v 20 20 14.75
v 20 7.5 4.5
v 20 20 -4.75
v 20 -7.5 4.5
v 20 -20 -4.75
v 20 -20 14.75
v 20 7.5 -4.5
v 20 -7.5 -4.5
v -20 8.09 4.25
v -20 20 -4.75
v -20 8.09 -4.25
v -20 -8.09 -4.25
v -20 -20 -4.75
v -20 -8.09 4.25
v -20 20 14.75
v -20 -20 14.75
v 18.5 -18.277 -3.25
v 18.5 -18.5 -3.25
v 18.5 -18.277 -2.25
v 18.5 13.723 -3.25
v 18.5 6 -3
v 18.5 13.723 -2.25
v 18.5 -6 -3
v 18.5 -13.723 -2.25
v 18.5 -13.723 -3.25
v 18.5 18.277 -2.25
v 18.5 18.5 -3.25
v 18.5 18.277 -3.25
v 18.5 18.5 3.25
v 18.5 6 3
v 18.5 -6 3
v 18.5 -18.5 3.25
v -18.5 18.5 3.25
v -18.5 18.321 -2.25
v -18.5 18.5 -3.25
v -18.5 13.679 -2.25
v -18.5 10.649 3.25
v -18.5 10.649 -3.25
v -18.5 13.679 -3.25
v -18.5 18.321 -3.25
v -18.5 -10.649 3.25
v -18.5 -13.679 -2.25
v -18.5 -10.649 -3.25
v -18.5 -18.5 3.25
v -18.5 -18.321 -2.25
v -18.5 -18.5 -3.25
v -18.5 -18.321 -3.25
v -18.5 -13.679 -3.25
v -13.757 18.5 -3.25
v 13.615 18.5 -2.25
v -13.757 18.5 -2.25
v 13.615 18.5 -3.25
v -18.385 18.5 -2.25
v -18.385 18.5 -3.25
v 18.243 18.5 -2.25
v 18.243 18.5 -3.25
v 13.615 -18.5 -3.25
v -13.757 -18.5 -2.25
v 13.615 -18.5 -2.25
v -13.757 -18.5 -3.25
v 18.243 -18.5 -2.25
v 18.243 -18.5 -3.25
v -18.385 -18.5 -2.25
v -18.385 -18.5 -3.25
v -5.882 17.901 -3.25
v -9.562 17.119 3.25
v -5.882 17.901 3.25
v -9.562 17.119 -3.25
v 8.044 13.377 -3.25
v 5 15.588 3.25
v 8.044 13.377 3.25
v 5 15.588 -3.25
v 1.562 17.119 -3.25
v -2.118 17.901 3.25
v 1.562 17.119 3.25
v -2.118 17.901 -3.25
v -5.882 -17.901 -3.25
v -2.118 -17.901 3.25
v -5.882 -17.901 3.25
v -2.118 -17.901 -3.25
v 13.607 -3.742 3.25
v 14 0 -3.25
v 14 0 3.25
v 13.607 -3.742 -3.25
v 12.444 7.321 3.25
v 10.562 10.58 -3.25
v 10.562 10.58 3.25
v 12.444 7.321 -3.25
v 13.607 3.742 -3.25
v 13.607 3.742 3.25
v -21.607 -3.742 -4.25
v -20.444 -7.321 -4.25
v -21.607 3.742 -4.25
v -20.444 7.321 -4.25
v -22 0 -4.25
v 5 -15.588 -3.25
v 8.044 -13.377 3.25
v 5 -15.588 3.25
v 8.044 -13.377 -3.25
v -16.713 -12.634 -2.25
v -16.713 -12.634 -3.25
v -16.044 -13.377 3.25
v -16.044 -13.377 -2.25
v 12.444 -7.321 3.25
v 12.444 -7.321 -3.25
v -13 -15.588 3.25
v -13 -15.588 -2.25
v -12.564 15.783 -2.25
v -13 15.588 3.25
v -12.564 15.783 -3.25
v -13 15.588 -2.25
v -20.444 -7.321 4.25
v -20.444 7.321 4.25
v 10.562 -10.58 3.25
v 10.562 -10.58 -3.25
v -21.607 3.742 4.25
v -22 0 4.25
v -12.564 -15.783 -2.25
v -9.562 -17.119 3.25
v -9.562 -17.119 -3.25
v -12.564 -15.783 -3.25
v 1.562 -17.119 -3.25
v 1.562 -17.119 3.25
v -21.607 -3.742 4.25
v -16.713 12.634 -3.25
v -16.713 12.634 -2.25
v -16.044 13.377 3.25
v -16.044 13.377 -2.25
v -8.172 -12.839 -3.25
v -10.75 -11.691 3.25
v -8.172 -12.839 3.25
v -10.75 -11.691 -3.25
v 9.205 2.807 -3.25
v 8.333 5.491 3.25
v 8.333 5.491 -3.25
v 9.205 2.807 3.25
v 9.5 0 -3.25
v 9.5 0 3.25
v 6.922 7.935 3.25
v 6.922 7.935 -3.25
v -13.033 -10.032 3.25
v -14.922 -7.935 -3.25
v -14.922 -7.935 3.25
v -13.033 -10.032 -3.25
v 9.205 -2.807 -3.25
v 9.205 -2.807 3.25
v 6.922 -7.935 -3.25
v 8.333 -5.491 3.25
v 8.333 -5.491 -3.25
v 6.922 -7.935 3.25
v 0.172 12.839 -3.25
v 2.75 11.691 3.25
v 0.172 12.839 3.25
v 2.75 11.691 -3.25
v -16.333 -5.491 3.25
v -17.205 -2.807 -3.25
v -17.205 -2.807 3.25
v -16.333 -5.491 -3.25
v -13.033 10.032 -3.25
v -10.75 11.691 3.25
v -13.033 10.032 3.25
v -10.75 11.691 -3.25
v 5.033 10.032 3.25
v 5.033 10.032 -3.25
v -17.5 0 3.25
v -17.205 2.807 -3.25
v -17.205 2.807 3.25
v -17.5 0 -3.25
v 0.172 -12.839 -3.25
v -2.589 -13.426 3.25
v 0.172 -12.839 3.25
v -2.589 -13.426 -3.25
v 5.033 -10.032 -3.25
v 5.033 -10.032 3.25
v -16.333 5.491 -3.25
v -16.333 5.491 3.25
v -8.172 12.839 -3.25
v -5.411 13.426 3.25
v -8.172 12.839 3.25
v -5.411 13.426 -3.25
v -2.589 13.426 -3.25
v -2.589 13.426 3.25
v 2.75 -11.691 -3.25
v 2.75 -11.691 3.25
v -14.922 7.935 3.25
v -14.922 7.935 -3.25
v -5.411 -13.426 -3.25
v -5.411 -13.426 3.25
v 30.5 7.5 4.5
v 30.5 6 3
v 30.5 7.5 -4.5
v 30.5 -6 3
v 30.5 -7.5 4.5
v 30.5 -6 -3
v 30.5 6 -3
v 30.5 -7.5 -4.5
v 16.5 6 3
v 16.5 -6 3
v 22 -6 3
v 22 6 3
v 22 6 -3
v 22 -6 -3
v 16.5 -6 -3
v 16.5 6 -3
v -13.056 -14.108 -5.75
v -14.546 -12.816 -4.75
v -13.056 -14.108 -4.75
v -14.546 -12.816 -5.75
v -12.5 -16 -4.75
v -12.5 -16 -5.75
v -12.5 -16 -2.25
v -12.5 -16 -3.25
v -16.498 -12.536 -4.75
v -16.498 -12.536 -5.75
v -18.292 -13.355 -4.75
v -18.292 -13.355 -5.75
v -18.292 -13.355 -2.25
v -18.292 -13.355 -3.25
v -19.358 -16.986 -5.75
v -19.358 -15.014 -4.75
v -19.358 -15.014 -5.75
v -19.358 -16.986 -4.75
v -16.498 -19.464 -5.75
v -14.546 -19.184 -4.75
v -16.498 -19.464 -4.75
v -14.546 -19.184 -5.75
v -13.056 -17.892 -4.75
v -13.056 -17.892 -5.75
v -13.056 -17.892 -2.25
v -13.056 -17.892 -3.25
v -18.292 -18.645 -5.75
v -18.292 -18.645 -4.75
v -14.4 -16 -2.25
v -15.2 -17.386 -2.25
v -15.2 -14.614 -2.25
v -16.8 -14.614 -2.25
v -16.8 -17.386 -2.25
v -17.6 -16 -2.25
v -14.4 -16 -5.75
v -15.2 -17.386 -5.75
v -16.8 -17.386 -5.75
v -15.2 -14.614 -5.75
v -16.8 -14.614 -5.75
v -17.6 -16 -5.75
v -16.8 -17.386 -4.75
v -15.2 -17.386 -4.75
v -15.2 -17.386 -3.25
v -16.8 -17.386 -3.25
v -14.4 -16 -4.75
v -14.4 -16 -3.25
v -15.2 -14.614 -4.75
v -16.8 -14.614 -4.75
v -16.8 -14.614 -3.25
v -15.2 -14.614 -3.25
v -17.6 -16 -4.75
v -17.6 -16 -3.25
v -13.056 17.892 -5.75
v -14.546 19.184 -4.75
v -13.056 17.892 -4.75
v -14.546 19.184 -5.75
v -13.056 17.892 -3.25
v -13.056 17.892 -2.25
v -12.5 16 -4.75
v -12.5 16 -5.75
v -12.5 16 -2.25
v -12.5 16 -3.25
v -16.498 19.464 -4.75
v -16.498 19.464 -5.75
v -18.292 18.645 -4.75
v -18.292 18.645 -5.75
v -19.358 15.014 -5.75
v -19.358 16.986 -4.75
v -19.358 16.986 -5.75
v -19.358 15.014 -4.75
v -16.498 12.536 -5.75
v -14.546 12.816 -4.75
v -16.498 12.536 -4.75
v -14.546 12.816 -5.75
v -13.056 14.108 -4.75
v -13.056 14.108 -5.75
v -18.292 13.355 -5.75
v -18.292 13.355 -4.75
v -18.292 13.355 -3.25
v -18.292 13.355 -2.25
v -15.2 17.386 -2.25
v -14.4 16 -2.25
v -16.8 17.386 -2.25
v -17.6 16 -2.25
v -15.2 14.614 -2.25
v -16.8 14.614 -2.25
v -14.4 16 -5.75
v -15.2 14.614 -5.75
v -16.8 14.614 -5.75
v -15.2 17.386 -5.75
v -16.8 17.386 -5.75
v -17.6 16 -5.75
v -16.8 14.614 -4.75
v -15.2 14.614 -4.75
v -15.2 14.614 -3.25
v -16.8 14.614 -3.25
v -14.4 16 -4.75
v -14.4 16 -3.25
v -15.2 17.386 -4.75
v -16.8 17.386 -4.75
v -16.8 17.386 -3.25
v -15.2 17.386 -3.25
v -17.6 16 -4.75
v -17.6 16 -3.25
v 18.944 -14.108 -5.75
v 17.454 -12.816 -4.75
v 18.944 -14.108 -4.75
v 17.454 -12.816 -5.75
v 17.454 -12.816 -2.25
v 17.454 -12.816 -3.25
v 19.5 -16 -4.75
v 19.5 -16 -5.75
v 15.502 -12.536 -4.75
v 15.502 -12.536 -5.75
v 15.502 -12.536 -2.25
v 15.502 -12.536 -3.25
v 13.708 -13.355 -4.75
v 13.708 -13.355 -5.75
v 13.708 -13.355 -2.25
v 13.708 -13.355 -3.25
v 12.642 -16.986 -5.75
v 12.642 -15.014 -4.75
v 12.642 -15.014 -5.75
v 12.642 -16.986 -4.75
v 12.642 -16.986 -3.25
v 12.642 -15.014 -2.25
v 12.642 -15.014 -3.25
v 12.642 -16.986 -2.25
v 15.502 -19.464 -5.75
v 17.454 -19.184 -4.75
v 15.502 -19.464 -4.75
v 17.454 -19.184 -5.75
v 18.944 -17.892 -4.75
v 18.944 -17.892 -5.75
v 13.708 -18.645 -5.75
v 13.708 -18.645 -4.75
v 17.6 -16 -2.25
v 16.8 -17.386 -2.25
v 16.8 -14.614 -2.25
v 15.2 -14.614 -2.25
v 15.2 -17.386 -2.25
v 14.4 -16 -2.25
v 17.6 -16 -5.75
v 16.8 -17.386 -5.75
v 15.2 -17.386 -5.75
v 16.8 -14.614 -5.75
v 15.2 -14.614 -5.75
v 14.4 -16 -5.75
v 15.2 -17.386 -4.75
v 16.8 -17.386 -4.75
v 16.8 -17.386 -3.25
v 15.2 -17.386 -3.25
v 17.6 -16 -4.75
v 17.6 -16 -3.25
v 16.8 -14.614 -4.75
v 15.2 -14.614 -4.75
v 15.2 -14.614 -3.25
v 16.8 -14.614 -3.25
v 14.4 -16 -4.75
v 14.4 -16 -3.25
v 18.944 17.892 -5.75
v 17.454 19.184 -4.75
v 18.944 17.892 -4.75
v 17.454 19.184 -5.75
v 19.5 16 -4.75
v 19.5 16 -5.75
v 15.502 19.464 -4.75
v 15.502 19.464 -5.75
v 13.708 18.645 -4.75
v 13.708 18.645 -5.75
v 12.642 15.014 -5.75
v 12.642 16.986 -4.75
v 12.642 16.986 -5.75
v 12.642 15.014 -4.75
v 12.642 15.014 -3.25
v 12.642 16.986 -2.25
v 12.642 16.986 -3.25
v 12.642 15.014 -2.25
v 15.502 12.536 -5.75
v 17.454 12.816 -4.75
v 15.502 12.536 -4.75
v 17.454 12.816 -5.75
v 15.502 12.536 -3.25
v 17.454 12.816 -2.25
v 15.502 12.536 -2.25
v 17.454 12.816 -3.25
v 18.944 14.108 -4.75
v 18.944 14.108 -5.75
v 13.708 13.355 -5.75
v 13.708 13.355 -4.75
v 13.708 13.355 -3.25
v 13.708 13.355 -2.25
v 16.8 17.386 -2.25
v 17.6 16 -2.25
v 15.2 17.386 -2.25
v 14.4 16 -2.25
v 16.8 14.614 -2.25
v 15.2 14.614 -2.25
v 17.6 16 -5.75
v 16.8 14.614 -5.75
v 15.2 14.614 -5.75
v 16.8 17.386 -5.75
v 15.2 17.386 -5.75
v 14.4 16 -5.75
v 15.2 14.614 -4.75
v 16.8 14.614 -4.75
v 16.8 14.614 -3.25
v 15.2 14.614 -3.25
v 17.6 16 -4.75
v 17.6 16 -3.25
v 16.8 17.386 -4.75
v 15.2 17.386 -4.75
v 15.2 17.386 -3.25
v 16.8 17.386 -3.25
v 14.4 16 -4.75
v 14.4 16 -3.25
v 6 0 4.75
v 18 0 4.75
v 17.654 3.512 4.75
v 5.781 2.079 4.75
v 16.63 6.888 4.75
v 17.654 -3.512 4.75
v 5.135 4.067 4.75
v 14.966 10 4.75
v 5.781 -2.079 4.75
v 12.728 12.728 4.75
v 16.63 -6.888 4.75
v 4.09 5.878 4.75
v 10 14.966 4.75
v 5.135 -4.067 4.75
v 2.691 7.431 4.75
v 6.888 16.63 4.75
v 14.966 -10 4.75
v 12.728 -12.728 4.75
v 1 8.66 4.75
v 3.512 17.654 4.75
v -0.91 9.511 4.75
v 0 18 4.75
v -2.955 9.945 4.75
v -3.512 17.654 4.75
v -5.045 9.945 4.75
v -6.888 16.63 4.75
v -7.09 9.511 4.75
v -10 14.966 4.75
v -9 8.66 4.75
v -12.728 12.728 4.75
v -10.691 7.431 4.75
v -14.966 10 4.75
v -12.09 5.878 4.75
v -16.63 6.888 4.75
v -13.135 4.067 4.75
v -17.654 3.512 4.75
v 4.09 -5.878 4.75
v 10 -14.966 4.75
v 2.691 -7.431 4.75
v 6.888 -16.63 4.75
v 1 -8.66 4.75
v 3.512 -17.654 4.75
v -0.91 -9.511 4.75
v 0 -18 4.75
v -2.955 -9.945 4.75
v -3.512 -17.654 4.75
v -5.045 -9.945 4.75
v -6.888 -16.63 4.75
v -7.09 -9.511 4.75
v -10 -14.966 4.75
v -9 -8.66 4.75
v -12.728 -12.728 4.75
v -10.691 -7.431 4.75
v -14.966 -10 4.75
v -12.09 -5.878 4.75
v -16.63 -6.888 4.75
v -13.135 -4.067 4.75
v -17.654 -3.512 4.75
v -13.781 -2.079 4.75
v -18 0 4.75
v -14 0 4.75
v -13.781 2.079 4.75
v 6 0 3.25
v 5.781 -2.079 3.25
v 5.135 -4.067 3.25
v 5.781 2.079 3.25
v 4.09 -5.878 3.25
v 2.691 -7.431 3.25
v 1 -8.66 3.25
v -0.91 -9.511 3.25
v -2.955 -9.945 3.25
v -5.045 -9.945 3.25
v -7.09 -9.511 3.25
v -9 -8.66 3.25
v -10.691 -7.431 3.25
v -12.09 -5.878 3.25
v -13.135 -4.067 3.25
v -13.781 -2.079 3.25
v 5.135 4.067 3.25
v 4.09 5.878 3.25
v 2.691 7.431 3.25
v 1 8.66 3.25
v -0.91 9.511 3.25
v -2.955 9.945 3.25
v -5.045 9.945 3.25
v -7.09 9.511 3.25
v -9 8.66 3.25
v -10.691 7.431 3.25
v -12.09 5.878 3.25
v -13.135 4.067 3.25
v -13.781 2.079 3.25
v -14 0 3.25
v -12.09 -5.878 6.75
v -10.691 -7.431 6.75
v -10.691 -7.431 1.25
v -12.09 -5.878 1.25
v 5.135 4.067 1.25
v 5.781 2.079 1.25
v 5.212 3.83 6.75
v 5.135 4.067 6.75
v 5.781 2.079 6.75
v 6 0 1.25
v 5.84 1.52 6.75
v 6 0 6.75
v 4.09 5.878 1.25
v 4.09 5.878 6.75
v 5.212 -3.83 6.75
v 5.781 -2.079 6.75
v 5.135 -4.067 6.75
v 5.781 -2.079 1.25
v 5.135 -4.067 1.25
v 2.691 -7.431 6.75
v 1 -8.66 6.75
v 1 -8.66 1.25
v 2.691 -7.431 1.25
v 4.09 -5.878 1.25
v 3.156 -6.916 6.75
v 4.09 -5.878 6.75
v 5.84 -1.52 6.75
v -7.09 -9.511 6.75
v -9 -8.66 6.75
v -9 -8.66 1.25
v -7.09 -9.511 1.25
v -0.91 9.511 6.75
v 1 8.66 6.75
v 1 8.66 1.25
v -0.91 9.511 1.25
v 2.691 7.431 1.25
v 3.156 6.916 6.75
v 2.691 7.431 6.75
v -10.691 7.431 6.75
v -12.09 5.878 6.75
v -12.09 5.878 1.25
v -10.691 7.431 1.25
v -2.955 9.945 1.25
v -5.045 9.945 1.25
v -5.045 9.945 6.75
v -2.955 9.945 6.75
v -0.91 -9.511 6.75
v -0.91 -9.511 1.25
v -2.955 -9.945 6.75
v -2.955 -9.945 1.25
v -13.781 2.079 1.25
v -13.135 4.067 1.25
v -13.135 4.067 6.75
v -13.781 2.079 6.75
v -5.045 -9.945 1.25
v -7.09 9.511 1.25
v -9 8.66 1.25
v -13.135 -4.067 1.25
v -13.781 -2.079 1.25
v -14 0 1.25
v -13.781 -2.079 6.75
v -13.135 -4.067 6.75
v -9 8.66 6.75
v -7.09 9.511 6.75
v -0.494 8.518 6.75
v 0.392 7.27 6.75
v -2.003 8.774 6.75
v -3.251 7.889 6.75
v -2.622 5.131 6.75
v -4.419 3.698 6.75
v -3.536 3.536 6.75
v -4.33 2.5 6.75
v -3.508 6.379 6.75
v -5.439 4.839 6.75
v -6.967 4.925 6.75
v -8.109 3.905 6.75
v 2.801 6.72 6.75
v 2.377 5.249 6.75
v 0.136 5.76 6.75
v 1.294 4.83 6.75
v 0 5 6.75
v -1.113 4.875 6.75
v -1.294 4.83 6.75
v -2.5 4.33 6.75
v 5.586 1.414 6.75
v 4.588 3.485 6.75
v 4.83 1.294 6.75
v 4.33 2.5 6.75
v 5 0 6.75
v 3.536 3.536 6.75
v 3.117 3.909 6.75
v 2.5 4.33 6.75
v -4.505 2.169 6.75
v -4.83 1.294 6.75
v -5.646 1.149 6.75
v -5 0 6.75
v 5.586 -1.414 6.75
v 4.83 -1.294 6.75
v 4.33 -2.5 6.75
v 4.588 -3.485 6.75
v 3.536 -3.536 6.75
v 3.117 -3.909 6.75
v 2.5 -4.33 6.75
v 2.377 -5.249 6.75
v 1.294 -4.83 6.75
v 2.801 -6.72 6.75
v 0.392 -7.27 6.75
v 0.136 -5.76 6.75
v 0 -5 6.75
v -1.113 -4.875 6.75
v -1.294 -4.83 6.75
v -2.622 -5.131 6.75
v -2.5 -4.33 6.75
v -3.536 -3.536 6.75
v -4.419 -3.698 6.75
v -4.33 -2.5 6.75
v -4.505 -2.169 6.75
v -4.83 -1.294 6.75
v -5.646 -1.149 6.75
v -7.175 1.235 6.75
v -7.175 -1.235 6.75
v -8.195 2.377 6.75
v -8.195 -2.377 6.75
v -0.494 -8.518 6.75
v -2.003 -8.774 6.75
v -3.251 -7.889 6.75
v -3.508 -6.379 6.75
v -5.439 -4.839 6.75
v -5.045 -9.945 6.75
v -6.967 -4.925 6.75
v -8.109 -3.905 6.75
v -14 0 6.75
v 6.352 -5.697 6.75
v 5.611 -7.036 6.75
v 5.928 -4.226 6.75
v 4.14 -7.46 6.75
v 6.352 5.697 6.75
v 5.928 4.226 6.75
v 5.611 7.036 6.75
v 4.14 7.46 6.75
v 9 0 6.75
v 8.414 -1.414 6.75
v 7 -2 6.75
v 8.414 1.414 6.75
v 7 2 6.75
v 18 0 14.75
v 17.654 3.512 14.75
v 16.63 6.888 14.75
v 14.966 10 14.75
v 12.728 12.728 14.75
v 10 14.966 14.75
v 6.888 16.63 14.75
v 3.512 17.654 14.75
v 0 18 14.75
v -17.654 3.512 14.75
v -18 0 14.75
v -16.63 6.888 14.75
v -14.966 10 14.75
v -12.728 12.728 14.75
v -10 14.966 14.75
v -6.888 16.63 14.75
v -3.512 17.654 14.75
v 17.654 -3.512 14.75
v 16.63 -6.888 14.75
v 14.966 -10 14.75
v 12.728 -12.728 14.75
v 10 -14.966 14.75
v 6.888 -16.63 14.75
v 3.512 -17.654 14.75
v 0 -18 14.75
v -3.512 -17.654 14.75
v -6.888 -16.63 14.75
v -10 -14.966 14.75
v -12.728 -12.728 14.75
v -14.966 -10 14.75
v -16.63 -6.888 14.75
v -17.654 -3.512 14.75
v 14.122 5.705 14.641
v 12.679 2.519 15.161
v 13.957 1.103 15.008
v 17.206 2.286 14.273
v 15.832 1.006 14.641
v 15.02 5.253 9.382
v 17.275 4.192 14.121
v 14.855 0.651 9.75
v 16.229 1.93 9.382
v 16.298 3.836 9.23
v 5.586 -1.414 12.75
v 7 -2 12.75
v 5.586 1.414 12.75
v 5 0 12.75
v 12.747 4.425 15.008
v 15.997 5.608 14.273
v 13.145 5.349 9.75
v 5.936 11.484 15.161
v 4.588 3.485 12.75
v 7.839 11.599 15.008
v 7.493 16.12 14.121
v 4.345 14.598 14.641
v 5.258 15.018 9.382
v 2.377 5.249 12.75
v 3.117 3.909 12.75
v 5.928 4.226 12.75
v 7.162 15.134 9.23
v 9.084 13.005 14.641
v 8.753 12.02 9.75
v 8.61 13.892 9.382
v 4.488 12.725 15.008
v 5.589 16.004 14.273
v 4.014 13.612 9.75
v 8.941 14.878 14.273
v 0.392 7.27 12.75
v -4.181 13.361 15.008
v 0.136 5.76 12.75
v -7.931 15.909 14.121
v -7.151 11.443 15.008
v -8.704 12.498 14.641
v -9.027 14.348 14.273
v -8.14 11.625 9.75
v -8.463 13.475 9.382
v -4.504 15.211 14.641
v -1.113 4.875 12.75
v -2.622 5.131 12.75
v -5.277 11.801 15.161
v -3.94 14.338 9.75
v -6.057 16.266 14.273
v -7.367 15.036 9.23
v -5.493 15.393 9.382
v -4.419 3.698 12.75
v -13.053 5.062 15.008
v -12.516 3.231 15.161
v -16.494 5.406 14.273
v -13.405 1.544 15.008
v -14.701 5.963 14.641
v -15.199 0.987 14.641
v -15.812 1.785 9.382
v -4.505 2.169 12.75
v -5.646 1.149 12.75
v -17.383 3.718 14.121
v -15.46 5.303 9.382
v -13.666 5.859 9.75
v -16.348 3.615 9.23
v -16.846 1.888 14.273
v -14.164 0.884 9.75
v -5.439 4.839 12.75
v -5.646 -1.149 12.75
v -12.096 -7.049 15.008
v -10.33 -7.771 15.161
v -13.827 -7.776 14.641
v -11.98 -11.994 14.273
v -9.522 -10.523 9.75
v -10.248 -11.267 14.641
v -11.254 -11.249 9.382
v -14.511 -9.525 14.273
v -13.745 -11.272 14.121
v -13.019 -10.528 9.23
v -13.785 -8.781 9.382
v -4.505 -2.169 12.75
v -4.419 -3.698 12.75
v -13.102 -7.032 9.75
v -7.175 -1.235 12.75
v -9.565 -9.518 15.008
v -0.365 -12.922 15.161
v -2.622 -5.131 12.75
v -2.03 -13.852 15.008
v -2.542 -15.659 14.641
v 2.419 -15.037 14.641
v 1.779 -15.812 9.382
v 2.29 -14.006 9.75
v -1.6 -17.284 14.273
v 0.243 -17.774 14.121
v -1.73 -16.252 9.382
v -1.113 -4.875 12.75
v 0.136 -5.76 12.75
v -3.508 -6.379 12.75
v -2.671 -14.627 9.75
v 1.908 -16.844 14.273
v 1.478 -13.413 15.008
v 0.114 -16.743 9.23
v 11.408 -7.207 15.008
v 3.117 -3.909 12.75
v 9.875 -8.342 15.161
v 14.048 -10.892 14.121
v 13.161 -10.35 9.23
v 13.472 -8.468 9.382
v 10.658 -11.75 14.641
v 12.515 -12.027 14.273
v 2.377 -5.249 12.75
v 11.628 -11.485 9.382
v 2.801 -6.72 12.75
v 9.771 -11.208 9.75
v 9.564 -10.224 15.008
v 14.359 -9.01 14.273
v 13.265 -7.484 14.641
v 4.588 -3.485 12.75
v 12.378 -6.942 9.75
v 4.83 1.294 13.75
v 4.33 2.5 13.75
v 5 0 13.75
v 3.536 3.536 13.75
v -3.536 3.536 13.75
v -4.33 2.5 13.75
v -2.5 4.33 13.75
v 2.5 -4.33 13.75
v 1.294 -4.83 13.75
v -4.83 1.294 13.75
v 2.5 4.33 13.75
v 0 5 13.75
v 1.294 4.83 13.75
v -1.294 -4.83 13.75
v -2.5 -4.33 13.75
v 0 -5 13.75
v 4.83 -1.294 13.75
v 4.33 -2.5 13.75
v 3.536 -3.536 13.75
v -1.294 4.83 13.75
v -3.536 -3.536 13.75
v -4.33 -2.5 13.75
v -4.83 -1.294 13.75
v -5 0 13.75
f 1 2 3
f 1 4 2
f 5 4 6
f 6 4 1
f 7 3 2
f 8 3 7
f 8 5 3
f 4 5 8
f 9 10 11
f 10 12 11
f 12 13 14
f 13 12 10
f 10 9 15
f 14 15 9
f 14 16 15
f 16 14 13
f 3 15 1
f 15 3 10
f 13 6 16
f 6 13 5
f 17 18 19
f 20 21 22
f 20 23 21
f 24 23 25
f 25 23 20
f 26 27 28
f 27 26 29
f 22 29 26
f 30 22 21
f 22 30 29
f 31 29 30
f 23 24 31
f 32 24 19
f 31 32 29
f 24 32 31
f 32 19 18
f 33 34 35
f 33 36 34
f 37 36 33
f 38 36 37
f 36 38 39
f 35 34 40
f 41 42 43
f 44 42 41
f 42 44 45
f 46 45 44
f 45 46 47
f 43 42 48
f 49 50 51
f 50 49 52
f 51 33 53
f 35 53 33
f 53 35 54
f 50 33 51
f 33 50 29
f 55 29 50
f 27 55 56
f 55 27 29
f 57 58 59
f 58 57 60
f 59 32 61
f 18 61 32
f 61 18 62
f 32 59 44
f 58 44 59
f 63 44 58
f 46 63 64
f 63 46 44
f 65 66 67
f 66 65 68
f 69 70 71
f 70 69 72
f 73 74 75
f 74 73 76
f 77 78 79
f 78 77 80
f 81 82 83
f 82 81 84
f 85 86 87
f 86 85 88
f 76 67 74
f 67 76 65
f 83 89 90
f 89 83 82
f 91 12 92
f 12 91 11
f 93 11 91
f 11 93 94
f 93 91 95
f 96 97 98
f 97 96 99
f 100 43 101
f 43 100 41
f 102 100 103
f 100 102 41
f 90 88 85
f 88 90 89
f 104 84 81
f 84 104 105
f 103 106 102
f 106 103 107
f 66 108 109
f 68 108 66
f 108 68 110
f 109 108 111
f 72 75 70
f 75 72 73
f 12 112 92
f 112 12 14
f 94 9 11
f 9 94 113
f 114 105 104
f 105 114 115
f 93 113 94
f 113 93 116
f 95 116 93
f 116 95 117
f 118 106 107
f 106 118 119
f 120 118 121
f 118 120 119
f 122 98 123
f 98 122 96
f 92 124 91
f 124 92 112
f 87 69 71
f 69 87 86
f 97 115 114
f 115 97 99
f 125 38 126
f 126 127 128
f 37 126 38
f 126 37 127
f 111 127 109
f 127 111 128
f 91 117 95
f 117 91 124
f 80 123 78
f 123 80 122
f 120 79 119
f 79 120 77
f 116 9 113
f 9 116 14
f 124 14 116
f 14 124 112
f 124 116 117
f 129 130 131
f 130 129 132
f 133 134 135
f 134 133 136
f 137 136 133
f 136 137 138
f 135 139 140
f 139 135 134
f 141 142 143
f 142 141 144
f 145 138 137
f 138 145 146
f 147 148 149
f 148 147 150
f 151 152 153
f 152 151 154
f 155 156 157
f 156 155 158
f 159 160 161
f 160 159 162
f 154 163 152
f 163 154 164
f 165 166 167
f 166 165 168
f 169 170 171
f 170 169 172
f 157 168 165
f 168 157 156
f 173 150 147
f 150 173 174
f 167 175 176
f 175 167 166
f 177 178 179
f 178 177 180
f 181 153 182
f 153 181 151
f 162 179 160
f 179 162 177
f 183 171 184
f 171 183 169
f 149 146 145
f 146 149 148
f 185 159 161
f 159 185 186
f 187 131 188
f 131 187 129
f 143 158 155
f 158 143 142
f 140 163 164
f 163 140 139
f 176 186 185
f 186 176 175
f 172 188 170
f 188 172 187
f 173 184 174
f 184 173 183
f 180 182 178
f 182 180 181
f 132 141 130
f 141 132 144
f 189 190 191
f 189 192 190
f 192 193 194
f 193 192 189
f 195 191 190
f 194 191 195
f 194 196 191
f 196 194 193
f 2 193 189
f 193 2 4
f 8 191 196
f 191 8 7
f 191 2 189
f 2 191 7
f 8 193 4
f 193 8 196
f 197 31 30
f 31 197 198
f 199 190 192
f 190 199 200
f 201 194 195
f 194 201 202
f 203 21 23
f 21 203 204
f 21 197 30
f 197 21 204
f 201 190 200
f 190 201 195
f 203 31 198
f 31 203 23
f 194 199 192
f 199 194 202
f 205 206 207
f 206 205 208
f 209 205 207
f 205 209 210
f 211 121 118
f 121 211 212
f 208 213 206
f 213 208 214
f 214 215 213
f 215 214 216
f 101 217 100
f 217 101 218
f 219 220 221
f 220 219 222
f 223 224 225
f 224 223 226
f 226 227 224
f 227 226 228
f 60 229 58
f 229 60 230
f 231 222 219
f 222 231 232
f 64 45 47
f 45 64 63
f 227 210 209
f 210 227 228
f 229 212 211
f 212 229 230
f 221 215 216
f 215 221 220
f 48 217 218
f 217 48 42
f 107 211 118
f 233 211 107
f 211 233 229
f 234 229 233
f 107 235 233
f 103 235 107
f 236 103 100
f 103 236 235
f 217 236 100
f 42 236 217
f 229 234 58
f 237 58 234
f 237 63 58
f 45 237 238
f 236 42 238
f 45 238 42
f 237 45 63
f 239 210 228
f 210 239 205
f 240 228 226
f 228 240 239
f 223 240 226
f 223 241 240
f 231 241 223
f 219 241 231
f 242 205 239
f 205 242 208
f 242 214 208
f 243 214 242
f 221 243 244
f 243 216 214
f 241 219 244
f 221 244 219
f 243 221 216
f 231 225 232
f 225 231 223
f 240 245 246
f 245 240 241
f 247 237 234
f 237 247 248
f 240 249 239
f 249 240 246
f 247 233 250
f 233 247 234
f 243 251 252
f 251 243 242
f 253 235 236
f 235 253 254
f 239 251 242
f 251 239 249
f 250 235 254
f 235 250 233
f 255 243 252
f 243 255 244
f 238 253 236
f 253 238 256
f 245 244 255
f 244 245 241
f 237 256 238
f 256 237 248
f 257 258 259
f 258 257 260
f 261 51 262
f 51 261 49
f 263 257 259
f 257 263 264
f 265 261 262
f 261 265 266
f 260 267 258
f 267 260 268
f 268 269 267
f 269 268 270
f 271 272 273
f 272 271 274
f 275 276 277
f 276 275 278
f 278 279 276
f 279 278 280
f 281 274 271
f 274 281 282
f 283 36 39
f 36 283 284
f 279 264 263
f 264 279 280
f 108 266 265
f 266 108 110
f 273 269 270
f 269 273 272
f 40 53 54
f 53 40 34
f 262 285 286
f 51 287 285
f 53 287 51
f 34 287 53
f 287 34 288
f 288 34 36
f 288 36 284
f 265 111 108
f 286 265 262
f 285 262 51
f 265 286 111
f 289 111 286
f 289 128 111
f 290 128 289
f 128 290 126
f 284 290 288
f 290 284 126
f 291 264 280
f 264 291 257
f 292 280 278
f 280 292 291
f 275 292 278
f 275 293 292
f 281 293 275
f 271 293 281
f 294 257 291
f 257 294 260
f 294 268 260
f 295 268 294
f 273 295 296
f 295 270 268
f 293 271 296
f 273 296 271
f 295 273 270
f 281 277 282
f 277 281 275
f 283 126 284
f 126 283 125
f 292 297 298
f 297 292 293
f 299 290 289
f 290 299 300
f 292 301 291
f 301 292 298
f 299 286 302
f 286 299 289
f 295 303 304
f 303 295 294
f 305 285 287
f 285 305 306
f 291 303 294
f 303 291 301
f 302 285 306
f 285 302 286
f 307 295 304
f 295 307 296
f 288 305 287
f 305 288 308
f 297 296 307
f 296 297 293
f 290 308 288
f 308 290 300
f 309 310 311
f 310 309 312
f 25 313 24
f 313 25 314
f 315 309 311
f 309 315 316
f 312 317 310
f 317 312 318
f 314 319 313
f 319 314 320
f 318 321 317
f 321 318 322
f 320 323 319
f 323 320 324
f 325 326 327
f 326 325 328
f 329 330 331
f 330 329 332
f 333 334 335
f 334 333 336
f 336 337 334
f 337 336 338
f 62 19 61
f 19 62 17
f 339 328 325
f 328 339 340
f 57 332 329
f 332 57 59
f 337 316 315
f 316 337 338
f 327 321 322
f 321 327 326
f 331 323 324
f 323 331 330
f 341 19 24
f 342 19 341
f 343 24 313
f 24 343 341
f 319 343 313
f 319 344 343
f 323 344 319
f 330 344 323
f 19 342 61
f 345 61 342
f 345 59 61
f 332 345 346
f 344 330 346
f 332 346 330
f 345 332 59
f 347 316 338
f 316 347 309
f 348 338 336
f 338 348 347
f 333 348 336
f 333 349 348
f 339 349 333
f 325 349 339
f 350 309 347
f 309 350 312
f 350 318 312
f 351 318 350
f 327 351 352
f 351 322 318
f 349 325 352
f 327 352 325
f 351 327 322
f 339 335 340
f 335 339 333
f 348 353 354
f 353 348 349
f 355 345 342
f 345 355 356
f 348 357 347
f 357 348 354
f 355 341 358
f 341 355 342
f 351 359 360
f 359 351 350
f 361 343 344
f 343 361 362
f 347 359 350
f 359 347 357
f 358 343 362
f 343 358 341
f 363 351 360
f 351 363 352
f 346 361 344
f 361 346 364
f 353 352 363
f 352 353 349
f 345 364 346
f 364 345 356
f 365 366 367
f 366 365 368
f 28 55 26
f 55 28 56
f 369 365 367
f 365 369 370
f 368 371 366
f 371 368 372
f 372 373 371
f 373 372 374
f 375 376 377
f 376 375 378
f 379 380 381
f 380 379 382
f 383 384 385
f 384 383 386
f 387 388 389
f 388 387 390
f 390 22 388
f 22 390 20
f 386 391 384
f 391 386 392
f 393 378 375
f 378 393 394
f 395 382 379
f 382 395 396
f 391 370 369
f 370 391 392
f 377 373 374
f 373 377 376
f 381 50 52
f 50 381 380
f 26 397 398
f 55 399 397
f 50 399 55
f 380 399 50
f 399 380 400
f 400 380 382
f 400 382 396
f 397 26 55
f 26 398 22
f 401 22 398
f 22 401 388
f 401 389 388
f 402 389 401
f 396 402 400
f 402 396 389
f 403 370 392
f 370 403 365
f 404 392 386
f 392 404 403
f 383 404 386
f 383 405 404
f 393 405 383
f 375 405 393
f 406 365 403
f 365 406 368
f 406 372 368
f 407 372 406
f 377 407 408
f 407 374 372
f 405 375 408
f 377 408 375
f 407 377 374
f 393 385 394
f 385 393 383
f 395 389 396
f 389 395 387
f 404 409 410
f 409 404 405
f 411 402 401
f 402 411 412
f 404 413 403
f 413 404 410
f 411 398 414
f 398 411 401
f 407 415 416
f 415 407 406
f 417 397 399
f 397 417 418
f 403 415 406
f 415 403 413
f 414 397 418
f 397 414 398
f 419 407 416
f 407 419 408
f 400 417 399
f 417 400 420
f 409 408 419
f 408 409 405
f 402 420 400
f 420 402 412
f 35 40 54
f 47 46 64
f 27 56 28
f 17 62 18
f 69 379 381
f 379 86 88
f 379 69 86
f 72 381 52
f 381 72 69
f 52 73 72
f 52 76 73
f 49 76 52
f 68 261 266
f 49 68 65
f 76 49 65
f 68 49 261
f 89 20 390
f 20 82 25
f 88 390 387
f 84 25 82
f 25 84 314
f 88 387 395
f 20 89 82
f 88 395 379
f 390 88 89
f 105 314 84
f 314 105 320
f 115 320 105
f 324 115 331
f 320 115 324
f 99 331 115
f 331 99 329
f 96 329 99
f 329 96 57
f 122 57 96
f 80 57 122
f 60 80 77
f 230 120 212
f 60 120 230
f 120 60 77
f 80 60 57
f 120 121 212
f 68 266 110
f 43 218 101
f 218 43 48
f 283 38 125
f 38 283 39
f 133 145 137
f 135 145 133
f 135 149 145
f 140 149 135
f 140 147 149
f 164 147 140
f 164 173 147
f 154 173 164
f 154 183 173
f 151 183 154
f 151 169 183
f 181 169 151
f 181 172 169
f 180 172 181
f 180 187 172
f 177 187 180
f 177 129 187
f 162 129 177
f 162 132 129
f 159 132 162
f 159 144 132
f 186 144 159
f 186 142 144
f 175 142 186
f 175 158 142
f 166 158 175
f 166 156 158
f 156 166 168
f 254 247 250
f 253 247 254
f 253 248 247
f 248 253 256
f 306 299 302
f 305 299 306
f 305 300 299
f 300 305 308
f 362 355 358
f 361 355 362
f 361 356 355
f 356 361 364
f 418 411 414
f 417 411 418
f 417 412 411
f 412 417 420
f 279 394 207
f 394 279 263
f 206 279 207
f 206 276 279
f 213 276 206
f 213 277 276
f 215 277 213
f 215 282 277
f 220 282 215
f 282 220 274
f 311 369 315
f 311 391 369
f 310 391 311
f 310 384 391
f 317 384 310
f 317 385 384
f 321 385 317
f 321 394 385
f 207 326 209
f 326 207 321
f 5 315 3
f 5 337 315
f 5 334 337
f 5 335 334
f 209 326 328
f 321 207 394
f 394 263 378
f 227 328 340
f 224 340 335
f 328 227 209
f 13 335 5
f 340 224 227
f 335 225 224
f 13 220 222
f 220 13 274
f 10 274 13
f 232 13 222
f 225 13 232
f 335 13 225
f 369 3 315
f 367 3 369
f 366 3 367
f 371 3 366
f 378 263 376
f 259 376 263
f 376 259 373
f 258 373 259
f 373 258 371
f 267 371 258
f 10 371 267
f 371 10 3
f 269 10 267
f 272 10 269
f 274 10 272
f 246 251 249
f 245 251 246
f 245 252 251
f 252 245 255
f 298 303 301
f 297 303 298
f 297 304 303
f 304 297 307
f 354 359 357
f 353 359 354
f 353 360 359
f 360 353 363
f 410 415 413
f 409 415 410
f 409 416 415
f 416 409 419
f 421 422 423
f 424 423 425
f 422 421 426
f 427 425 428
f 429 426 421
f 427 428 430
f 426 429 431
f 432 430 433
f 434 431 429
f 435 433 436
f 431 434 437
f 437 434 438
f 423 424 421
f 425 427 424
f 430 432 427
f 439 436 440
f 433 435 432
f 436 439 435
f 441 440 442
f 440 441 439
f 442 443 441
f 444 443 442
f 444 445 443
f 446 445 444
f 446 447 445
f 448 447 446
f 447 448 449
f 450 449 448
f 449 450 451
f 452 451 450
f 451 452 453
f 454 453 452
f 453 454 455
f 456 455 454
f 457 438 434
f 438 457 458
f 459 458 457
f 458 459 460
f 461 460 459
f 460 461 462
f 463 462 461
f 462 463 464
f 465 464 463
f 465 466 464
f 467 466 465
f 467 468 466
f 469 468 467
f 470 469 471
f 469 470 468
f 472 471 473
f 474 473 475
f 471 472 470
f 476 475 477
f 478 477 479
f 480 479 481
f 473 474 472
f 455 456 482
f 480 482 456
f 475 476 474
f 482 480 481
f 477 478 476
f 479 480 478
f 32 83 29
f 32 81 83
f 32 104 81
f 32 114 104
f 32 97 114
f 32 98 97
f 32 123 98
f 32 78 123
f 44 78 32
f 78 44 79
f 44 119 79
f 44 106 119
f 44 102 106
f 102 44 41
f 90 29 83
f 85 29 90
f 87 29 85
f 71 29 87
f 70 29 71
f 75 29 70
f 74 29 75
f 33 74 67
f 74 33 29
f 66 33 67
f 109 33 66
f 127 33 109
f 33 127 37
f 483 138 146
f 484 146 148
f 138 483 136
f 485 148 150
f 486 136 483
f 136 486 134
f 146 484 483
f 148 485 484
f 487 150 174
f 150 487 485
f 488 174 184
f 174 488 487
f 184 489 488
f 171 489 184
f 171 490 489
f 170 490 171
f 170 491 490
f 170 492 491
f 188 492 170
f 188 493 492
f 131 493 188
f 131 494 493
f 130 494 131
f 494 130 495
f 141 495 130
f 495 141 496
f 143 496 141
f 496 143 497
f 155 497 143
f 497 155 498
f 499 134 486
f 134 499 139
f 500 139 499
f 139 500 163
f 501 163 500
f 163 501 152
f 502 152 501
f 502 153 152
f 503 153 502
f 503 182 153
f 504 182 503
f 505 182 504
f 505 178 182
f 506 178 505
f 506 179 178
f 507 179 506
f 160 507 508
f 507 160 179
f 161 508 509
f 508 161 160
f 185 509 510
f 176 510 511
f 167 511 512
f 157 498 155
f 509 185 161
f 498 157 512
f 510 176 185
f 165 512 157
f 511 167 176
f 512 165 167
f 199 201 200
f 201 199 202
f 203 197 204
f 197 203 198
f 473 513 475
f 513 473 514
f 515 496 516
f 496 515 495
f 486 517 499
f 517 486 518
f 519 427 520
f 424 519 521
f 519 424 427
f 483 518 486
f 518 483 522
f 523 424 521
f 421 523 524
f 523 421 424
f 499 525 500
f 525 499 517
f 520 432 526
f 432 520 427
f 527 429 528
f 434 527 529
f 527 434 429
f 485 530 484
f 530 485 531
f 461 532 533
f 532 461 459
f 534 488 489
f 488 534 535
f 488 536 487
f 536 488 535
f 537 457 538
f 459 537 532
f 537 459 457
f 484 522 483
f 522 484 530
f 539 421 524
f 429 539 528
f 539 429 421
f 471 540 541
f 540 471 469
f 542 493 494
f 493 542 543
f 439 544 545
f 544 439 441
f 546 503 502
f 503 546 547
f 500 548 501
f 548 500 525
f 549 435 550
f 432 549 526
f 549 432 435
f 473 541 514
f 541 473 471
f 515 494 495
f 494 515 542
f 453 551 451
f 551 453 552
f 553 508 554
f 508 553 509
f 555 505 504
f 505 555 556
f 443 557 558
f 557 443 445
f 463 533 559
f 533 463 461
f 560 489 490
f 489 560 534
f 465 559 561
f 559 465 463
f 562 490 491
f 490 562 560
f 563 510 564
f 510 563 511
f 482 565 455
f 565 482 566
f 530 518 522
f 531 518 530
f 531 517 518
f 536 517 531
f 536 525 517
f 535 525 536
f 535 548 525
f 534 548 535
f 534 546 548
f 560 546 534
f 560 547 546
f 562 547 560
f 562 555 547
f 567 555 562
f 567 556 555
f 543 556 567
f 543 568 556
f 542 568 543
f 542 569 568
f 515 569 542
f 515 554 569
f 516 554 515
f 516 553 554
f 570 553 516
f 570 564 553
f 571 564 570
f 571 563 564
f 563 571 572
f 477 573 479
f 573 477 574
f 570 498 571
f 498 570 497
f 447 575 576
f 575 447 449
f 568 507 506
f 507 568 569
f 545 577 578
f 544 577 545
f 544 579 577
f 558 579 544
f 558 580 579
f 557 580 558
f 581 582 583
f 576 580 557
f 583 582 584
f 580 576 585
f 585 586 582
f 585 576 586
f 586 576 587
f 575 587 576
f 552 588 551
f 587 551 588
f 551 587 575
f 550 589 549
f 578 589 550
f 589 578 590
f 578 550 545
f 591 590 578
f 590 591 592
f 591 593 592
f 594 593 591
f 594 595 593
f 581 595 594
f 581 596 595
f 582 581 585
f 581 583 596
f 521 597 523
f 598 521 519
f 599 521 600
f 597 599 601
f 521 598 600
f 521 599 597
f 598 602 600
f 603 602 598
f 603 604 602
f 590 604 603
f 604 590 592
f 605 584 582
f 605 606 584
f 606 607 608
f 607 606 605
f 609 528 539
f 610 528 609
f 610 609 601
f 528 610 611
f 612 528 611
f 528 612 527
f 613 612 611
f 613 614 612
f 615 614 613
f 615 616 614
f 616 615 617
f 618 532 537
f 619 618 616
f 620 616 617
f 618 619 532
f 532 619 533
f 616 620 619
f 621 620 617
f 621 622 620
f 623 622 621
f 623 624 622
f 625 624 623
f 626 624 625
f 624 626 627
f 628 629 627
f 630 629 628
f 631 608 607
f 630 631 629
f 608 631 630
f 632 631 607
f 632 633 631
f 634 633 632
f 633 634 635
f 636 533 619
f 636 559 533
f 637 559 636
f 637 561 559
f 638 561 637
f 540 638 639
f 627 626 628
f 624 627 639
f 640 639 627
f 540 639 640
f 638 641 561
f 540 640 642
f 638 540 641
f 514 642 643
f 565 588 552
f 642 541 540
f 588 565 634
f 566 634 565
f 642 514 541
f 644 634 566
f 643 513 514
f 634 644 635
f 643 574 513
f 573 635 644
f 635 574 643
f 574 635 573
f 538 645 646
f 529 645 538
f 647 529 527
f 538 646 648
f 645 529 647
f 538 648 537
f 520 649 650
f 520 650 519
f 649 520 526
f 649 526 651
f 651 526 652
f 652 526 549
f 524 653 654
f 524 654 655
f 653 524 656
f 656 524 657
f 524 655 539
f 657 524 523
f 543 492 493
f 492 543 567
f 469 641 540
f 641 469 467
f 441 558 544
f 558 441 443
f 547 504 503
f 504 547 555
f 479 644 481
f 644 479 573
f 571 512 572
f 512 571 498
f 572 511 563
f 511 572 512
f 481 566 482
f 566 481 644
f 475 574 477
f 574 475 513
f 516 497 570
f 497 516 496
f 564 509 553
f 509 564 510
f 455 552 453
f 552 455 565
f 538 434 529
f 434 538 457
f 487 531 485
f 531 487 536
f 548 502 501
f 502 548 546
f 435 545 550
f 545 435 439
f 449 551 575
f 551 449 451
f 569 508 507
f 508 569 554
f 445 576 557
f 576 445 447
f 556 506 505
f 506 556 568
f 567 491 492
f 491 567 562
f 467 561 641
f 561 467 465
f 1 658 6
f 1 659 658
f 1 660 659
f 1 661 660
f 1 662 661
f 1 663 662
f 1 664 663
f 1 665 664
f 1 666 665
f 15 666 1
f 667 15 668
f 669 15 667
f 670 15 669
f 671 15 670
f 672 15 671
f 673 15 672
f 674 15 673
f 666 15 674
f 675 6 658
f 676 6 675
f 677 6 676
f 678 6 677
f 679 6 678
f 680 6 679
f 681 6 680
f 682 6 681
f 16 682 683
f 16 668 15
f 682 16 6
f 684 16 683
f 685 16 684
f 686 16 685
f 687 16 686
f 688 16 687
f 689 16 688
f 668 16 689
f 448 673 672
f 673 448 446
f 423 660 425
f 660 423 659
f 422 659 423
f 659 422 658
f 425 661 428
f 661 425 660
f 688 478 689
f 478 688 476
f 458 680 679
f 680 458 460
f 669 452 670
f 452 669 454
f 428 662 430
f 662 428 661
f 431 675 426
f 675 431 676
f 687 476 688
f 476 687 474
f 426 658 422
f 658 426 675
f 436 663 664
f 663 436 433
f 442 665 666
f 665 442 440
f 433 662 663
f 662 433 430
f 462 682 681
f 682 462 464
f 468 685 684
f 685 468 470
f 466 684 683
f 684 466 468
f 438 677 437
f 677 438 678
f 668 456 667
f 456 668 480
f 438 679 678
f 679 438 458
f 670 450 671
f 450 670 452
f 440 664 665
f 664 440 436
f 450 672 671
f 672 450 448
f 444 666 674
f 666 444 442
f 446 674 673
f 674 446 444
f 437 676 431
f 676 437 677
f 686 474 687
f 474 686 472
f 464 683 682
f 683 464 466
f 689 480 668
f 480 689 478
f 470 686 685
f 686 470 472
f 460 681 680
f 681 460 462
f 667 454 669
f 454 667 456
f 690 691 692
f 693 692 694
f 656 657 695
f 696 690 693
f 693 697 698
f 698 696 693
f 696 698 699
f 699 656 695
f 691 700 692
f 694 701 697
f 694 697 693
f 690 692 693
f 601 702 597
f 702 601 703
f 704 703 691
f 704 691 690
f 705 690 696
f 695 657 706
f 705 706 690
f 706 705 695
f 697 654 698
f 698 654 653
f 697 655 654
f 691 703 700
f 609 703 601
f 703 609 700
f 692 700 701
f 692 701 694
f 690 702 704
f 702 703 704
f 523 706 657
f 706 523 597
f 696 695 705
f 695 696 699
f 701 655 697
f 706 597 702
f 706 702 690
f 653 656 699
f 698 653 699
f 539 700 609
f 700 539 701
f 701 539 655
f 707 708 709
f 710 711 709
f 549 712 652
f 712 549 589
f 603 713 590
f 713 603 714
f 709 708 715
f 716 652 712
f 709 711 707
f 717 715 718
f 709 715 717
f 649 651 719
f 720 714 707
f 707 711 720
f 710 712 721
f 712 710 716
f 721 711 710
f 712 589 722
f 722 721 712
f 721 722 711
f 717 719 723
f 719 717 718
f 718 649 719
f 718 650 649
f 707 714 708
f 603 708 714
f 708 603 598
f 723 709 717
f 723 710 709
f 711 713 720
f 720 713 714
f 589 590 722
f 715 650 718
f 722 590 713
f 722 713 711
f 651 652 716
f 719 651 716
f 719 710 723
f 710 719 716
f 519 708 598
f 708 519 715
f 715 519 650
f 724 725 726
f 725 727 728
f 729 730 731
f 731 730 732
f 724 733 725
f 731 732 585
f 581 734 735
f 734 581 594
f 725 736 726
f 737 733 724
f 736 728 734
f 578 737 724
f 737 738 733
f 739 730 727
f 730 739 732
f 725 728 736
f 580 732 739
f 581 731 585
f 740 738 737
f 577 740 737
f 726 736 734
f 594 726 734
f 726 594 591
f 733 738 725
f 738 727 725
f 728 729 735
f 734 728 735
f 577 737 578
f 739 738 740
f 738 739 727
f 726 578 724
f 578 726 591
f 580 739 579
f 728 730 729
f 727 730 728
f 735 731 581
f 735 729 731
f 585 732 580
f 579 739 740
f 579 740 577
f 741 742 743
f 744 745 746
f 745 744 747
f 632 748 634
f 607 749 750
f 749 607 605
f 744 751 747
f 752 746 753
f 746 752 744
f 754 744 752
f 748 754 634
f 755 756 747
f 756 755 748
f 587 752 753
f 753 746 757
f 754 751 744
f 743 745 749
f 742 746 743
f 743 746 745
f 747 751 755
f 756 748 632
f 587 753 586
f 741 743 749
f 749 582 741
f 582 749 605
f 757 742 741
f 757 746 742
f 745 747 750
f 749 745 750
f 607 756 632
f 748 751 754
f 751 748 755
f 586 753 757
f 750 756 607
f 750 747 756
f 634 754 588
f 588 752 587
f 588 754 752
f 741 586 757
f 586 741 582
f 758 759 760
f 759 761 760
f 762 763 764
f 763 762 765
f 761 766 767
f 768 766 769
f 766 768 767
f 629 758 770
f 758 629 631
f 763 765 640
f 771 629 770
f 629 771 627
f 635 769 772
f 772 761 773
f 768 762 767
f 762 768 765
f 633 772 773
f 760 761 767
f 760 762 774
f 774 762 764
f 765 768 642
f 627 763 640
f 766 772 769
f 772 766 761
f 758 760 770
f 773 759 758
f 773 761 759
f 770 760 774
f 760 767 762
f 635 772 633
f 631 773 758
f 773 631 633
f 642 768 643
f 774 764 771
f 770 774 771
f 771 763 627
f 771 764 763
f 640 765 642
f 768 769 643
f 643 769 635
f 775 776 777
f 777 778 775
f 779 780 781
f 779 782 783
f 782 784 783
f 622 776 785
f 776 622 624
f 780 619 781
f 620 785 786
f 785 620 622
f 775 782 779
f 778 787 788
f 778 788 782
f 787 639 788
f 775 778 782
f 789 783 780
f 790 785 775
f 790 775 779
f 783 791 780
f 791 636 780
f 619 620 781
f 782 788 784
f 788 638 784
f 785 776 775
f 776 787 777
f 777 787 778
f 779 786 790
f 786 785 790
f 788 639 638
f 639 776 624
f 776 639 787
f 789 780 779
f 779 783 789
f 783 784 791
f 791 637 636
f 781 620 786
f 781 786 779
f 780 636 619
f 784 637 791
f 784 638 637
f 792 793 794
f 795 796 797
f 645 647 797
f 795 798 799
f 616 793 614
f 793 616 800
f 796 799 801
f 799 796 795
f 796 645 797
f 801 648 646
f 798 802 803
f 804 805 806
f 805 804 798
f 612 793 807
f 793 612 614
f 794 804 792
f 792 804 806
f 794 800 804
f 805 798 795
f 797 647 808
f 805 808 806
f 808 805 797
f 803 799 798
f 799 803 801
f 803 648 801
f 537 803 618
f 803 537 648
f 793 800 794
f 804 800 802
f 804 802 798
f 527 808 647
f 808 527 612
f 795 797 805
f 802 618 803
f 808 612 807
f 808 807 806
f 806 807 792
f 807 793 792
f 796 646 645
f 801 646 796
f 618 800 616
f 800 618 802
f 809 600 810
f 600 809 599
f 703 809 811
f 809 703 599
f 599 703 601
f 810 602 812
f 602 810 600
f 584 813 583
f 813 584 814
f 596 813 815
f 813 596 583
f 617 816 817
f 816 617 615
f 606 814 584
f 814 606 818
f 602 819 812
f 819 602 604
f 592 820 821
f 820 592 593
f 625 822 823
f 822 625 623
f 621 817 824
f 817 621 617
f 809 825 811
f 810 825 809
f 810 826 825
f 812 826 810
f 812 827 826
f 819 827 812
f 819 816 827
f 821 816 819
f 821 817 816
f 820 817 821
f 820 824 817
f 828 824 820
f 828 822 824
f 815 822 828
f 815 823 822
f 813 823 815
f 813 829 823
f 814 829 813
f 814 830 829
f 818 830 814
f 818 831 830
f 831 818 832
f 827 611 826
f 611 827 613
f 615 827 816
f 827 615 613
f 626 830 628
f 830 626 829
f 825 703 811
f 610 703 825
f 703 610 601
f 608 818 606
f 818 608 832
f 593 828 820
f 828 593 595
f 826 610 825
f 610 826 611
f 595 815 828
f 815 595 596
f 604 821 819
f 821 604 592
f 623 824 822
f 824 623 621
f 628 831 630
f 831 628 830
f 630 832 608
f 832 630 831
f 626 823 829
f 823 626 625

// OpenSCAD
// Parameters
overall_width = 40; //[20:80:0.5]
overall_length = 40; //[20:80:0.5]
overall_depth = 9.5; //[5:19:0.1]
wall_thickness = 1.5; //[0.8:3:0.1]
base_plate_thickness = 1.5; //[0.8:3:0.1]
top_cover_thickness = 1.5; //[0.8:3:0.1]
inlet_bore_diameter = 20; //[10:40:0.5]
outlet_width = 12; //[6:24:0.5]
outlet_height = 6; //[3:12:0.5]
outlet_length = 10; //[5:20:0.5]
impeller_outer_diameter = 34; //[17:38:0.5]
impeller_hub_diameter = 10; //[5:20:0.5]
impeller_blade_count = 25; //[10:40:1]
clearance_radial = 0.5; //[0.2:1.5:0.1]
clearance_axial = 0.5; //[0.2:1.5:0.1]
volute_outer_radius = 18; //[10:25:0.5]
volute_inner_radius = 15; //[8:22:0.5]
axis_offset_x = -4; //[-10:10:0.5]
axis_offset_y = 0; //[-10:10:0.5]
mount_hole_diameter = 3.2; //[2:5:0.1]
mount_hole_pitch = 32; //[20:38:0.5]
lug_diameter = 7; //[5:12:0.5]
overlap = 1; //[0.5:2:0.1]

// Blower module
module blower() {
  color([0.15, 0.15, 0.17]) {
    // Base plate
    translate([0, 0, -overall_depth/2 + base_plate_thickness/2])
      cube([overall_width, overall_length, base_plate_thickness], center=true);

    // Top cover plate
    translate([0, 0, overall_depth/2 - top_cover_thickness/2])
      cube([overall_width, overall_length, top_cover_thickness], center=true);

    // Side walls
    difference() {
      translate([0, 0, 0])
        cube([overall_width, overall_length, overall_depth - base_plate_thickness - top_cover_thickness + overlap*2], center=true);
      translate([0, 0, 0])
        cube([overall_width - 2*wall_thickness, overall_length - 2*wall_thickness, overall_depth - base_plate_thickness - top_cover_thickness + overlap*4], center=true);
    }

    // Volute
    difference() {
      translate([axis_offset_x, axis_offset_y, 0])
        cylinder(r=volute_outer_radius, h=overall_depth - base_plate_thickness - top_cover_thickness + overlap*2, center=true);
      translate([axis_offset_x, axis_offset_y, 0])
        cylinder(r=volute_inner_radius - wall_thickness, h=overall_depth - base_plate_thickness - top_cover_thickness + overlap*4, center=true);
    }

    // Outlet duct
    difference() {
      translate([overall_width/2 + (outlet_length + wall_thickness)/2 - overlap, axis_offset_y, 0])
        cube([outlet_length + wall_thickness, outlet_width + 2*wall_thickness, outlet_height + 2*wall_thickness], center=true);
      translate([overall_width/2 + (outlet_length + wall_thickness)/2 - overlap, axis_offset_y, 0])
        cube([outlet_length + wall_thickness + overlap*2, outlet_width, outlet_height], center=true);
    }

    // Outlet port cut in wall
    translate([overall_width/2 - wall_thickness/2, axis_offset_y, 0])
      cube([wall_thickness + overlap*4, outlet_width, outlet_height], center=true);

    // Inlet bore opening cut
    translate([axis_offset_x, axis_offset_y, overall_depth/2 - top_cover_thickness/2])
      cylinder(r=inlet_bore_diameter/2, h=top_cover_thickness + overlap*4, center=true);

    // Mounting lugs
    for (x = [-1, 1], y = [-1, 1]) {
      translate([x * mount_hole_pitch/2, y * mount_hole_pitch/2, -overall_depth/2 + base_plate_thickness/2])
        difference() {
          cylinder(r=lug_diameter/2, h=base_plate_thickness + overlap*2, center=true);
          cylinder(r=mount_hole_diameter/2, h=base_plate_thickness + overlap*6, center=true);
        }
    }
  }
}

// Fan module
module fan() {
  color([0.2, 0.2, 0.22]) {
    // Frame
    difference() {
      cube([overall_width, overall_width, 10], center=true);
      cylinder(d=overall_width-4, h=12, center=true, $fn=32);
    }
    // Hub
    cylinder(d=impeller_hub_diameter, h=8, center=true, $fn=24);
    // Blades
    for(i=[0:6]) rotate([0,0,i*360/7])
      hull() {
        translate([impeller_hub_diameter/2+2,0,-3]) cylinder(r=2, h=6, $fn=8);
        translate([impeller_outer_diameter/2-3,3,0]) rotate([0,12,20]) cylinder(r=2.5, h=5, $fn=8);
      }
  }
}

// Blower Fan module
module blower_fan() {
  blower();
  translate([0, 0, overall_depth/2 + 5]) fan();
}

// Assembly module
module assembly() {
  blower_fan();
}

assembly();
